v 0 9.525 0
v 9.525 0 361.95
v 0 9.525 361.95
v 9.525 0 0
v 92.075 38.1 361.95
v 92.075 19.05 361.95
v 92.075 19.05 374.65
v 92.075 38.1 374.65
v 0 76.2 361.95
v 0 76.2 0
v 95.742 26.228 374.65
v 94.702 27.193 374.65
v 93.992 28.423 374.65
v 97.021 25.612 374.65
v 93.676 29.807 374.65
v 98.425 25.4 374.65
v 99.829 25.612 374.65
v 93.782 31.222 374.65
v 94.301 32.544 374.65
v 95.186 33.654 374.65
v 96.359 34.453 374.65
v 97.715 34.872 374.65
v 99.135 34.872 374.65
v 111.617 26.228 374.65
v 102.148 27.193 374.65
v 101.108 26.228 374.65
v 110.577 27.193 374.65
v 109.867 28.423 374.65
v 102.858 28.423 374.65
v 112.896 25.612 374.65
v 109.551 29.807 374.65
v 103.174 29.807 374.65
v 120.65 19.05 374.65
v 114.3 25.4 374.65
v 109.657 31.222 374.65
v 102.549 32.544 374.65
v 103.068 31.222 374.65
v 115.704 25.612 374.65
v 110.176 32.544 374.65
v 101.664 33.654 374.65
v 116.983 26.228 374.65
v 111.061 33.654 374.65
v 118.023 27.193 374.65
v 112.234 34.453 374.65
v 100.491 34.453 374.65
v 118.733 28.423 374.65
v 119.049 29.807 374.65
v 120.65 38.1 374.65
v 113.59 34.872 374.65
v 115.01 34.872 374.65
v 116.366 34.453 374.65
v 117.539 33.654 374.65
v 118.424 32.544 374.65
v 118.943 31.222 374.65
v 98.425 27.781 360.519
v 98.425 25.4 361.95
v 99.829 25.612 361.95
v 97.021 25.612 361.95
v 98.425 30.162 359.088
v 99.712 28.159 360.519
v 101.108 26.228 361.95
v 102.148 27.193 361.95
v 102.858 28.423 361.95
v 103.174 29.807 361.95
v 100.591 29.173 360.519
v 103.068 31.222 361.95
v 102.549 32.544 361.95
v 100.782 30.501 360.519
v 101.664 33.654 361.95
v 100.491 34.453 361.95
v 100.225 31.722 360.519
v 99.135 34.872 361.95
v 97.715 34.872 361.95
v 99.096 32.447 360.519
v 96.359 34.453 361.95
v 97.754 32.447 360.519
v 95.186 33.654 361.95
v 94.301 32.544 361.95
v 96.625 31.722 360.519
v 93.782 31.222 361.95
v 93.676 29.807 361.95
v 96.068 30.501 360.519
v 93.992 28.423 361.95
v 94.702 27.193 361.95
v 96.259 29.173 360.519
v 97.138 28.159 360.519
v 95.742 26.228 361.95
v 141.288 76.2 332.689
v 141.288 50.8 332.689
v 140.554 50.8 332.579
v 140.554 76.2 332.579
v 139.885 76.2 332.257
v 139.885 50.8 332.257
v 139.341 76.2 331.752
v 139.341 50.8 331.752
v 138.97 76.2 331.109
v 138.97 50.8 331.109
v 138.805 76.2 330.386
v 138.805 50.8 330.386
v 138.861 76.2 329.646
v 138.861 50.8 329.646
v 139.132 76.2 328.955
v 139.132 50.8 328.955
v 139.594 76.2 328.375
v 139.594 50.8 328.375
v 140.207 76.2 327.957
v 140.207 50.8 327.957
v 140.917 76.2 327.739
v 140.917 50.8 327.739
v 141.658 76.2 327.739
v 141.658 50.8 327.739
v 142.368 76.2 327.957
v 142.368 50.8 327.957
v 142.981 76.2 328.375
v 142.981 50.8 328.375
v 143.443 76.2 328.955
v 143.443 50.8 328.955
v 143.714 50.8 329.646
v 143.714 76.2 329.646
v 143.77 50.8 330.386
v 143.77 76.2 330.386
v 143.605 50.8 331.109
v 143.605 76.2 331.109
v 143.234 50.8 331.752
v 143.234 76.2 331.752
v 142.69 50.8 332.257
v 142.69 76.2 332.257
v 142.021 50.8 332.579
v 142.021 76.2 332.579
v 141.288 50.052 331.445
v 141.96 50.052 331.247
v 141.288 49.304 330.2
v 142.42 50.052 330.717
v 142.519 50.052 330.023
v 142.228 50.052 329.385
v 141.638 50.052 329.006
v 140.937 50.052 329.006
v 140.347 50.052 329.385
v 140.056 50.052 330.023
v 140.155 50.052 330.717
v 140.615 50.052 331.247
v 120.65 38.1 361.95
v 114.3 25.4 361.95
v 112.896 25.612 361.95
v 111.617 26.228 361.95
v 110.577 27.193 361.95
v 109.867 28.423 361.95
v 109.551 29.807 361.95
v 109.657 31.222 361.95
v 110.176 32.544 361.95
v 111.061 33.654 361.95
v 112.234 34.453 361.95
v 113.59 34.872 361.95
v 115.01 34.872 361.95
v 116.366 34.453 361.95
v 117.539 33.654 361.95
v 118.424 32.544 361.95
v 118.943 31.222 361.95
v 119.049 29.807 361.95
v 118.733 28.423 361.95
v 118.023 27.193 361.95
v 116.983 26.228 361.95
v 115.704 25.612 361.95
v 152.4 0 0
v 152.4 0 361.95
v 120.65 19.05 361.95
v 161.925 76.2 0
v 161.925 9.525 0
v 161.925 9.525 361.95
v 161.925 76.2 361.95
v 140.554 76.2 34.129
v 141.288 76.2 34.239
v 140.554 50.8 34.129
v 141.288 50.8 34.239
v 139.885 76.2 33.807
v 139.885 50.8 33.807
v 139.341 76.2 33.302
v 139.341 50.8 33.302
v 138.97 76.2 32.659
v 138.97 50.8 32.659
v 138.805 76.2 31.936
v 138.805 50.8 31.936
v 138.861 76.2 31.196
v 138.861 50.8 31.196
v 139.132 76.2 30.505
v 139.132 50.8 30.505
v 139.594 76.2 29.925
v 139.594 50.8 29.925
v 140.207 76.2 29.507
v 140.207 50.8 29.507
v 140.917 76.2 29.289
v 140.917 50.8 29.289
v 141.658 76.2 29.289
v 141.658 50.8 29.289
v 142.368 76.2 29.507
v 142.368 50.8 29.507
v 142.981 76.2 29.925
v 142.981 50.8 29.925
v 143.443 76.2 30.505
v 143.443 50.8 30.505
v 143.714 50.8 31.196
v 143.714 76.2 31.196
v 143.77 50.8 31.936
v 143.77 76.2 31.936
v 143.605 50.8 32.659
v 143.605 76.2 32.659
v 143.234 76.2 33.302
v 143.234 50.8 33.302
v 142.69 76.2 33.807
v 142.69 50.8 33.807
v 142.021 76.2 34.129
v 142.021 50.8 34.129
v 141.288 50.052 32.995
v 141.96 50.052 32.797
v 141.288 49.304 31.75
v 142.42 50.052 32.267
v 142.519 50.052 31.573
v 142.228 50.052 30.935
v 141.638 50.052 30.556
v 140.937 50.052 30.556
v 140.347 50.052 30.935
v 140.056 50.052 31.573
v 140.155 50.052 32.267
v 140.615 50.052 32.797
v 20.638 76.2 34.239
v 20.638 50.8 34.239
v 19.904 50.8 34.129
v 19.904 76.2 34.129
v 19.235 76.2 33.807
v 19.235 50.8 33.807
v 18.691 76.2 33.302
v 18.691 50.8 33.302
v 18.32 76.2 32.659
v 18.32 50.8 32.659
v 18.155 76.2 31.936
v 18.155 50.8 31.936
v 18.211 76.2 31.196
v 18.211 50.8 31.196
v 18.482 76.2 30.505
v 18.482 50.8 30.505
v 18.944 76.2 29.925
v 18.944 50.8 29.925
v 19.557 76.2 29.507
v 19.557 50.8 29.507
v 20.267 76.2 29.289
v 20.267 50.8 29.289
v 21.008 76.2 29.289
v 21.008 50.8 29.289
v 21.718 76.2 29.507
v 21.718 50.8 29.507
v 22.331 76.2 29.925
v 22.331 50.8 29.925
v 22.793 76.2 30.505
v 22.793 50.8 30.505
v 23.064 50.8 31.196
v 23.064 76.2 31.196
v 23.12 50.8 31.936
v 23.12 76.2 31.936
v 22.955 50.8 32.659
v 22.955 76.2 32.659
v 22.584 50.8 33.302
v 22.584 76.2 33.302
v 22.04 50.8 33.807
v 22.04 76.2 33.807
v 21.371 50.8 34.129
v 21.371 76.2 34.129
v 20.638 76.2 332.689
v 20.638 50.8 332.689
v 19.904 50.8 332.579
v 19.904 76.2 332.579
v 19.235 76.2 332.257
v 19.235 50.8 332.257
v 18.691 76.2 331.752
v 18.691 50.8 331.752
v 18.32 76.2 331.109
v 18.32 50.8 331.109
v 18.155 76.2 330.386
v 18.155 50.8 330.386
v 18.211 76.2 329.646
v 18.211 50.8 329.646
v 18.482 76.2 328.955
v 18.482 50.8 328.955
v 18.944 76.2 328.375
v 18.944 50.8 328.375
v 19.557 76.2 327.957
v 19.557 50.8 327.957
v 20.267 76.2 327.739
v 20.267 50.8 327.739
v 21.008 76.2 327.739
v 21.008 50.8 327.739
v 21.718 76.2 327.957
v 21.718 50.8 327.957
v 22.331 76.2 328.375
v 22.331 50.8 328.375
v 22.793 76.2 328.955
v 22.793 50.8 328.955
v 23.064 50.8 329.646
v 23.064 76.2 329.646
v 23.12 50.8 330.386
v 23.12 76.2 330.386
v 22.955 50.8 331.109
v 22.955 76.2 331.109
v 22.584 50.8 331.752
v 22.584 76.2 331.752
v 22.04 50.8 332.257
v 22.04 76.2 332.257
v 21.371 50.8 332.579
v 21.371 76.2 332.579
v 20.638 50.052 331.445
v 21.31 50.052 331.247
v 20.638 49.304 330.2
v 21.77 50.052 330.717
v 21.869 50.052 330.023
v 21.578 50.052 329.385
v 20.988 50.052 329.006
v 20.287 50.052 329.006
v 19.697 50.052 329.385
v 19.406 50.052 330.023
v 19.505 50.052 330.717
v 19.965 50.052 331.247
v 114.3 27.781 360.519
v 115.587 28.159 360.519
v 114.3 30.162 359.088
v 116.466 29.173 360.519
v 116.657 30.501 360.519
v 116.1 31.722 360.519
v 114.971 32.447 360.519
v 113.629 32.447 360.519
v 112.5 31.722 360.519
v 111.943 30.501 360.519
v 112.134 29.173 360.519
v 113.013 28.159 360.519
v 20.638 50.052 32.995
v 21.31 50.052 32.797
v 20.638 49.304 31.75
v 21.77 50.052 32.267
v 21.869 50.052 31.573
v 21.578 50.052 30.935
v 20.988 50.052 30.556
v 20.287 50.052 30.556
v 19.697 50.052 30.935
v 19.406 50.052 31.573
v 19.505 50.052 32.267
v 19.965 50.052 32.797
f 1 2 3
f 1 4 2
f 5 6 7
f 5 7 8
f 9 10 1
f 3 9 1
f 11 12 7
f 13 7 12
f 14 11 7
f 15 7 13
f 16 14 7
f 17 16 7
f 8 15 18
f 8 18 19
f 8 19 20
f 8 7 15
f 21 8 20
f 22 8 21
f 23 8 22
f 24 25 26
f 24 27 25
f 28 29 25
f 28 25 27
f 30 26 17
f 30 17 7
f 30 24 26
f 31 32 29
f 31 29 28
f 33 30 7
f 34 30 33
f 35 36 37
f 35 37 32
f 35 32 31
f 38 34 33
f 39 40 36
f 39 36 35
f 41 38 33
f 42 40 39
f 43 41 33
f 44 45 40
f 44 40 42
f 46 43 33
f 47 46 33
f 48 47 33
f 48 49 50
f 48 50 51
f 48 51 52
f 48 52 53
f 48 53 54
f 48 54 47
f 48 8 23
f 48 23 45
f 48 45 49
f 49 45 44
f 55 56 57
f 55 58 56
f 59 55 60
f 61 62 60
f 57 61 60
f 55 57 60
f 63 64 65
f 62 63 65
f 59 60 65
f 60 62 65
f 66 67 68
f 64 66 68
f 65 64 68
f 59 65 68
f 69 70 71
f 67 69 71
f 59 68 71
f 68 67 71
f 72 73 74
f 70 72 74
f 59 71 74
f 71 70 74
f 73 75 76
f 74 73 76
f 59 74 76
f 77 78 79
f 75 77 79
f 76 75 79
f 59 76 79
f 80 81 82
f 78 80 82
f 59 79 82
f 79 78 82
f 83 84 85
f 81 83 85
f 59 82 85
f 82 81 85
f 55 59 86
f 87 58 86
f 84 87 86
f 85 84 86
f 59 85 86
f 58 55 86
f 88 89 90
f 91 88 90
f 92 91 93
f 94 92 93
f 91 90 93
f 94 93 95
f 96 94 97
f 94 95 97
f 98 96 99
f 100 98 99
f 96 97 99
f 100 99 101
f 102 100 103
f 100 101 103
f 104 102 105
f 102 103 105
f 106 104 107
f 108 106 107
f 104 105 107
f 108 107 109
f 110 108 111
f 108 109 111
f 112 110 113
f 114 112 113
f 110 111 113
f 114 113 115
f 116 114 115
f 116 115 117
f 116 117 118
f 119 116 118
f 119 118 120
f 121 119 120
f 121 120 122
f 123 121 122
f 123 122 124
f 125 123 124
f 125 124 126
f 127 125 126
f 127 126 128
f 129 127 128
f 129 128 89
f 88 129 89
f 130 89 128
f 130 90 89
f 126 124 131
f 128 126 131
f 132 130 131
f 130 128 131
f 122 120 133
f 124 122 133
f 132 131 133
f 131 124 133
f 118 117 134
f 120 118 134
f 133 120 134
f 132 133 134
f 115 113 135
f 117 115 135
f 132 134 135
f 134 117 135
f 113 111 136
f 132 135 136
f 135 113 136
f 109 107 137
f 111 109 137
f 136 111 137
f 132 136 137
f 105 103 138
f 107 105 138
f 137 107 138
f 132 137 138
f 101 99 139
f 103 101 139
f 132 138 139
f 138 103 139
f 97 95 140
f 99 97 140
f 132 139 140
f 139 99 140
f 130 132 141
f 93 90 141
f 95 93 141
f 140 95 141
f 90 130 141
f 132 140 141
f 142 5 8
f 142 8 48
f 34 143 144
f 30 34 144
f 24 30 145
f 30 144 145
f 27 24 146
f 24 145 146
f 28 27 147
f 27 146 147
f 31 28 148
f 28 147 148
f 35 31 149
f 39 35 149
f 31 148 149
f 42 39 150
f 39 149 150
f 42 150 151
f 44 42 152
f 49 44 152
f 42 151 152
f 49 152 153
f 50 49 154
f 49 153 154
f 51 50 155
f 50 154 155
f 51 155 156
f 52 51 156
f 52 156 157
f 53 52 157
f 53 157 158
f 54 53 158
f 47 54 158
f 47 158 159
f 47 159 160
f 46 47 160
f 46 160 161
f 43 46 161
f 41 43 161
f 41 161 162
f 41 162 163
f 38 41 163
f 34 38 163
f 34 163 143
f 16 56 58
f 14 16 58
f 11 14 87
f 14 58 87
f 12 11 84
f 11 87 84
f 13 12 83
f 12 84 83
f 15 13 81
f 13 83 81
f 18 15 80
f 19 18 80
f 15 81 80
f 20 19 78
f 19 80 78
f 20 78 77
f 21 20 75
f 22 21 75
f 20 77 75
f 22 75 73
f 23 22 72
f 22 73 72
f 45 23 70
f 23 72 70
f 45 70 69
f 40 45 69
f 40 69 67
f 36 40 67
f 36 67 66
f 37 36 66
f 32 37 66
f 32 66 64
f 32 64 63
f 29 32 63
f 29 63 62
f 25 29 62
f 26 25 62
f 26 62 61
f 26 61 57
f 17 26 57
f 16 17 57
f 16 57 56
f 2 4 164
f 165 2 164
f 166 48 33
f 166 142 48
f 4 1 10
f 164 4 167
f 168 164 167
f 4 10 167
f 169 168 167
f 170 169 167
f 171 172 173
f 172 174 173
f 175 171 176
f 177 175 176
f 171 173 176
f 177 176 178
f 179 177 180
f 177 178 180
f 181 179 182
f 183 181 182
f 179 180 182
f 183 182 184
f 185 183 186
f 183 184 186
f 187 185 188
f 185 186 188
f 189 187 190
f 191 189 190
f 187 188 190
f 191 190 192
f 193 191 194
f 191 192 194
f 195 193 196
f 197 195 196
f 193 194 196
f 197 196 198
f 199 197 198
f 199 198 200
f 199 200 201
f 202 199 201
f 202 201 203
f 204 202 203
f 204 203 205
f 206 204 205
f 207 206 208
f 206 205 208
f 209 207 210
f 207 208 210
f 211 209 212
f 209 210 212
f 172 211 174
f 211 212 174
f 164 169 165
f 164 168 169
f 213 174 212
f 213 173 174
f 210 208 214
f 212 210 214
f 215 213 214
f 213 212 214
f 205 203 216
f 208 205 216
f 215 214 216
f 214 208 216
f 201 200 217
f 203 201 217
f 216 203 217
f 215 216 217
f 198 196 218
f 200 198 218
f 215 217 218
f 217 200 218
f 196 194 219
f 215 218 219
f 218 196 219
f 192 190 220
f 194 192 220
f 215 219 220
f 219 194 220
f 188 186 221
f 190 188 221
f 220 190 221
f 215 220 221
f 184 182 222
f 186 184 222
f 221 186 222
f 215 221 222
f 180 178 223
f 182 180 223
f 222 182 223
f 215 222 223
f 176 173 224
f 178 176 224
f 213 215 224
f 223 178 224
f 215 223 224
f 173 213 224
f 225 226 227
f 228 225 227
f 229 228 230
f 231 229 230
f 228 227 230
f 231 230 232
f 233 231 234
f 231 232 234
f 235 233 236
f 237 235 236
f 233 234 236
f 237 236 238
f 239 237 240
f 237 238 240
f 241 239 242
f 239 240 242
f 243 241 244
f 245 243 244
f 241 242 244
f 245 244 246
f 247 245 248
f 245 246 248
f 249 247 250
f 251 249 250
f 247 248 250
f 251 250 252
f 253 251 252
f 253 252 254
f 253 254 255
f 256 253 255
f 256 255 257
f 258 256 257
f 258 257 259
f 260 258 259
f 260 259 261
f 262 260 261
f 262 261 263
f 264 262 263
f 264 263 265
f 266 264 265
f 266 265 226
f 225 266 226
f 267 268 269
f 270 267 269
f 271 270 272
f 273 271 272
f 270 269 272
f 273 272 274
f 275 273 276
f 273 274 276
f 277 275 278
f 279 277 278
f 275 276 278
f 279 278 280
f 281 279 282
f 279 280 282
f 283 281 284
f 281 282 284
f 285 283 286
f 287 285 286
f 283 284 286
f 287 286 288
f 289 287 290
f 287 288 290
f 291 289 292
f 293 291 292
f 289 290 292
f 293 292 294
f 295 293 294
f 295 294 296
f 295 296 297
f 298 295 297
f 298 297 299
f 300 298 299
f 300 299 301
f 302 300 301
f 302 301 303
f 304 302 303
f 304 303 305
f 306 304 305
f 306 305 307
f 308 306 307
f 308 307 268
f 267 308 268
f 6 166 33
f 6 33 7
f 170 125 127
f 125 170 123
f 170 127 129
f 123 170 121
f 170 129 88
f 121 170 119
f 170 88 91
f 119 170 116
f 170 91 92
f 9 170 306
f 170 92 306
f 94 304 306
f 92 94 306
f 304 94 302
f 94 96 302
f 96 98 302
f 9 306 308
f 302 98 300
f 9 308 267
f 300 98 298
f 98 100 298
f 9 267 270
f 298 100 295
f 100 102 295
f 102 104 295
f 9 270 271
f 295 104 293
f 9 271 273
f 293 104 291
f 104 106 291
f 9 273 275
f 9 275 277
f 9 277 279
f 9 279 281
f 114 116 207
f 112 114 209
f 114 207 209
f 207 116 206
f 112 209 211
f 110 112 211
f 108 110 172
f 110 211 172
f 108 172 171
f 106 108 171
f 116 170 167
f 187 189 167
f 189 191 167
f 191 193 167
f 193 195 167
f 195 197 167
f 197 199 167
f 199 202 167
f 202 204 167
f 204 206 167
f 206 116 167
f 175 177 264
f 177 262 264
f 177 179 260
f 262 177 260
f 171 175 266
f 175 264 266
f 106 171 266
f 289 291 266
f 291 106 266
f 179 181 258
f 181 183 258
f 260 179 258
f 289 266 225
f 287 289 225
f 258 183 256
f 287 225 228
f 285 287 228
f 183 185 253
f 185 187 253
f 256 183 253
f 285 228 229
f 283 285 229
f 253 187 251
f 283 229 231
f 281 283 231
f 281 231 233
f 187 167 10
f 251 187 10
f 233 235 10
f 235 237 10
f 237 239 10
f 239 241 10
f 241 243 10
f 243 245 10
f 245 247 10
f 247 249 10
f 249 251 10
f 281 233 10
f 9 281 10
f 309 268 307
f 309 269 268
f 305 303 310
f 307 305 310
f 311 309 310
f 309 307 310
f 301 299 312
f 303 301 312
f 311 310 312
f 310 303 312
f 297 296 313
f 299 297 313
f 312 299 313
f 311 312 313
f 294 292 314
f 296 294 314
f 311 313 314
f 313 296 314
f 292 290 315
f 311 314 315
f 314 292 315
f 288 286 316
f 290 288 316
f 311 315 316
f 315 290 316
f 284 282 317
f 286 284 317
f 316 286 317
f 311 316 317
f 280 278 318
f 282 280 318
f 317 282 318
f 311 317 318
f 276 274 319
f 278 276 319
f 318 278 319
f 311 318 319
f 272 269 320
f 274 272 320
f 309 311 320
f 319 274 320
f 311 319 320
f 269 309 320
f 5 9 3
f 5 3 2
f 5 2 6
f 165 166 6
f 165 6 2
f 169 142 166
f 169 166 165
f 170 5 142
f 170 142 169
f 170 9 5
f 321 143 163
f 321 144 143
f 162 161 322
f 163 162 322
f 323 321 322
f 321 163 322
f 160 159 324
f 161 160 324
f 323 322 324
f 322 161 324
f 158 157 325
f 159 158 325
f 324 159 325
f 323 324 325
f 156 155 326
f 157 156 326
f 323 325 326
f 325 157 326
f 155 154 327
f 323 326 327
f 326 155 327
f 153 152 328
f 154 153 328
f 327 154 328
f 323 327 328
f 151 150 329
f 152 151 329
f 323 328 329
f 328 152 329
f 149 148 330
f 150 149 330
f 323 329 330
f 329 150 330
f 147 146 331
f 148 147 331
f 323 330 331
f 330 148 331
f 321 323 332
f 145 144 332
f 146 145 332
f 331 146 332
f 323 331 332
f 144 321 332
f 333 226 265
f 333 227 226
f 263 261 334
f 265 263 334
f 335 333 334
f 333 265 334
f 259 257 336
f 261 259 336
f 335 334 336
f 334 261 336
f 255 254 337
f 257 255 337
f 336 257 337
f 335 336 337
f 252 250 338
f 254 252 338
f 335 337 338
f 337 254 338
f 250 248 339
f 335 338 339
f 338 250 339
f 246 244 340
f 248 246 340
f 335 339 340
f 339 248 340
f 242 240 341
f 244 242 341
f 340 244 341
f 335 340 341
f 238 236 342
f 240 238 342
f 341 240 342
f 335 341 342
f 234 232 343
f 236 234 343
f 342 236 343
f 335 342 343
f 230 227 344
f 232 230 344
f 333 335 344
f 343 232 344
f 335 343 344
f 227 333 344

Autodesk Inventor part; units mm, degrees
ref_plane "YZ Plane" through (0, 0, 0) normal (1, 0, 0) x (0, 1, 0)
ref_plane "XZ Plane" through (0, 0, 0) normal (0, 1, 0) x (-1, 0, 0)
ref_plane "XY Plane" through (0, 0, 0) normal (0, 0, 1) x (1, 0, 0)
sketch "Sketch1" plane through (0, 0, 0) normal (0, 0, 1) x (1, 0, 0)
  line L0 (9.525, 0) -> (152.4, 0)
  line L1 (161.925, 9.525) -> (161.925, 76.2)
  line L2 (161.925, 76.2) -> (0, 76.2)
  line L3 (0, 76.2) -> (0, 9.525)
  line L4 (9.525, 0) -> (0, 9.525)
  line L5 (161.925, 9.525) -> (152.4, 0)
  point P0 (0, 0)
  point P1 (161.925, 0)
  dimension "d0" = 161.925
  dimension "d1" = 76.2
  dimension "d2" = 9.525
  dimension "d3" = 9.525
  dimension "d4" = 9.525
  dimension "d5" = 9.525
extrude "Main Body" add sketch "Sketch1" along normal blind 361.95
sketch "Sketch2" plane through (0, 0, 361.95) normal (0, 0, 1) x (1, 0, 0)
  line L0 (161.925, 76.2) -> (161.925, 9.525) projected
  line L1 (152.4, 0) -> (9.525, 0) projected
  line L2 (92.075, 38.1) -> (120.65, 38.1)
  line L3 (120.65, 38.1) -> (120.65, 19.05)
  line L4 (120.65, 19.05) -> (92.075, 19.05)
  line L5 (92.075, 19.05) -> (92.075, 38.1)
  point P0 (0, 0)
  dimension "d8" = 41.275
  dimension "d9" = 19.05
  dimension "d10" = 28.575
  dimension "d11" = 19.05
extrude "Terminal Block" add sketch "Sketch2" along normal blind 12.7
sketch "Sketch3" plane through (0, 0, 374.65) normal (0, 0, 1) x (1, 0, 0)
  line L0 (92.075, 38.1) -> (120.65, 38.1) projected
  line L1 (98.425, 30.1625) -> (114.3, 30.1625)
  point P0 (0, 0)
  point P1 (106.3625, 30.1625)
  point P2 (106.3625, 38.1)
  dimension "d14" = 15.875
  dimension "d15" = 7.9375
hole "Terminal Holes" at (98.425, 30.1625, 374.65) at (114.3, 30.1625, 374.65) direction (0, 0, -1) diameter 9.525 depth 12.7 tip angle 118
sketch "Sketch4" plane through (0, 76.2, 0) normal (0, 1, 0) x (1, 0, 0)
  line L0 (0, 0) -> (161.925, 0) projected
  line L1 (0, 0) -> (0, -361.95) projected
  line L2 (20.6375, -31.75) -> (141.2875, -31.75)
  line L3 (141.2875, -31.75) -> (141.2875, -330.2)
  line L4 (141.2875, -330.2) -> (20.6375, -330.2)
  line L5 (20.6375, -330.2) -> (20.6375, -31.75)
  point P0 (20.6375, -180.975)
  point P1 (0, -180.975)
  point P2 (80.9625, 0)
  point P3 (80.9625, -31.75)
  dimension "d23" = 120.65
  dimension "d24" = 298.45
hole "Hole2" at (20.6375, 76.2, 31.75) at (141.2875, 76.2, 31.75) at (141.2875, 76.2, 330.2) at (20.6375, 76.2, 330.2) direction (0, -1, 0) diameter 4.9784 depth 25.4 tip angle 118 thread size "1/4-20 UNC" class "2B" standard "ANSI Unified Screw Threads"
equation "\"d3\" = d2"
equation "\"d4\" = d2"
equation "\"d5\" = d4"
properties part number "inverter"
